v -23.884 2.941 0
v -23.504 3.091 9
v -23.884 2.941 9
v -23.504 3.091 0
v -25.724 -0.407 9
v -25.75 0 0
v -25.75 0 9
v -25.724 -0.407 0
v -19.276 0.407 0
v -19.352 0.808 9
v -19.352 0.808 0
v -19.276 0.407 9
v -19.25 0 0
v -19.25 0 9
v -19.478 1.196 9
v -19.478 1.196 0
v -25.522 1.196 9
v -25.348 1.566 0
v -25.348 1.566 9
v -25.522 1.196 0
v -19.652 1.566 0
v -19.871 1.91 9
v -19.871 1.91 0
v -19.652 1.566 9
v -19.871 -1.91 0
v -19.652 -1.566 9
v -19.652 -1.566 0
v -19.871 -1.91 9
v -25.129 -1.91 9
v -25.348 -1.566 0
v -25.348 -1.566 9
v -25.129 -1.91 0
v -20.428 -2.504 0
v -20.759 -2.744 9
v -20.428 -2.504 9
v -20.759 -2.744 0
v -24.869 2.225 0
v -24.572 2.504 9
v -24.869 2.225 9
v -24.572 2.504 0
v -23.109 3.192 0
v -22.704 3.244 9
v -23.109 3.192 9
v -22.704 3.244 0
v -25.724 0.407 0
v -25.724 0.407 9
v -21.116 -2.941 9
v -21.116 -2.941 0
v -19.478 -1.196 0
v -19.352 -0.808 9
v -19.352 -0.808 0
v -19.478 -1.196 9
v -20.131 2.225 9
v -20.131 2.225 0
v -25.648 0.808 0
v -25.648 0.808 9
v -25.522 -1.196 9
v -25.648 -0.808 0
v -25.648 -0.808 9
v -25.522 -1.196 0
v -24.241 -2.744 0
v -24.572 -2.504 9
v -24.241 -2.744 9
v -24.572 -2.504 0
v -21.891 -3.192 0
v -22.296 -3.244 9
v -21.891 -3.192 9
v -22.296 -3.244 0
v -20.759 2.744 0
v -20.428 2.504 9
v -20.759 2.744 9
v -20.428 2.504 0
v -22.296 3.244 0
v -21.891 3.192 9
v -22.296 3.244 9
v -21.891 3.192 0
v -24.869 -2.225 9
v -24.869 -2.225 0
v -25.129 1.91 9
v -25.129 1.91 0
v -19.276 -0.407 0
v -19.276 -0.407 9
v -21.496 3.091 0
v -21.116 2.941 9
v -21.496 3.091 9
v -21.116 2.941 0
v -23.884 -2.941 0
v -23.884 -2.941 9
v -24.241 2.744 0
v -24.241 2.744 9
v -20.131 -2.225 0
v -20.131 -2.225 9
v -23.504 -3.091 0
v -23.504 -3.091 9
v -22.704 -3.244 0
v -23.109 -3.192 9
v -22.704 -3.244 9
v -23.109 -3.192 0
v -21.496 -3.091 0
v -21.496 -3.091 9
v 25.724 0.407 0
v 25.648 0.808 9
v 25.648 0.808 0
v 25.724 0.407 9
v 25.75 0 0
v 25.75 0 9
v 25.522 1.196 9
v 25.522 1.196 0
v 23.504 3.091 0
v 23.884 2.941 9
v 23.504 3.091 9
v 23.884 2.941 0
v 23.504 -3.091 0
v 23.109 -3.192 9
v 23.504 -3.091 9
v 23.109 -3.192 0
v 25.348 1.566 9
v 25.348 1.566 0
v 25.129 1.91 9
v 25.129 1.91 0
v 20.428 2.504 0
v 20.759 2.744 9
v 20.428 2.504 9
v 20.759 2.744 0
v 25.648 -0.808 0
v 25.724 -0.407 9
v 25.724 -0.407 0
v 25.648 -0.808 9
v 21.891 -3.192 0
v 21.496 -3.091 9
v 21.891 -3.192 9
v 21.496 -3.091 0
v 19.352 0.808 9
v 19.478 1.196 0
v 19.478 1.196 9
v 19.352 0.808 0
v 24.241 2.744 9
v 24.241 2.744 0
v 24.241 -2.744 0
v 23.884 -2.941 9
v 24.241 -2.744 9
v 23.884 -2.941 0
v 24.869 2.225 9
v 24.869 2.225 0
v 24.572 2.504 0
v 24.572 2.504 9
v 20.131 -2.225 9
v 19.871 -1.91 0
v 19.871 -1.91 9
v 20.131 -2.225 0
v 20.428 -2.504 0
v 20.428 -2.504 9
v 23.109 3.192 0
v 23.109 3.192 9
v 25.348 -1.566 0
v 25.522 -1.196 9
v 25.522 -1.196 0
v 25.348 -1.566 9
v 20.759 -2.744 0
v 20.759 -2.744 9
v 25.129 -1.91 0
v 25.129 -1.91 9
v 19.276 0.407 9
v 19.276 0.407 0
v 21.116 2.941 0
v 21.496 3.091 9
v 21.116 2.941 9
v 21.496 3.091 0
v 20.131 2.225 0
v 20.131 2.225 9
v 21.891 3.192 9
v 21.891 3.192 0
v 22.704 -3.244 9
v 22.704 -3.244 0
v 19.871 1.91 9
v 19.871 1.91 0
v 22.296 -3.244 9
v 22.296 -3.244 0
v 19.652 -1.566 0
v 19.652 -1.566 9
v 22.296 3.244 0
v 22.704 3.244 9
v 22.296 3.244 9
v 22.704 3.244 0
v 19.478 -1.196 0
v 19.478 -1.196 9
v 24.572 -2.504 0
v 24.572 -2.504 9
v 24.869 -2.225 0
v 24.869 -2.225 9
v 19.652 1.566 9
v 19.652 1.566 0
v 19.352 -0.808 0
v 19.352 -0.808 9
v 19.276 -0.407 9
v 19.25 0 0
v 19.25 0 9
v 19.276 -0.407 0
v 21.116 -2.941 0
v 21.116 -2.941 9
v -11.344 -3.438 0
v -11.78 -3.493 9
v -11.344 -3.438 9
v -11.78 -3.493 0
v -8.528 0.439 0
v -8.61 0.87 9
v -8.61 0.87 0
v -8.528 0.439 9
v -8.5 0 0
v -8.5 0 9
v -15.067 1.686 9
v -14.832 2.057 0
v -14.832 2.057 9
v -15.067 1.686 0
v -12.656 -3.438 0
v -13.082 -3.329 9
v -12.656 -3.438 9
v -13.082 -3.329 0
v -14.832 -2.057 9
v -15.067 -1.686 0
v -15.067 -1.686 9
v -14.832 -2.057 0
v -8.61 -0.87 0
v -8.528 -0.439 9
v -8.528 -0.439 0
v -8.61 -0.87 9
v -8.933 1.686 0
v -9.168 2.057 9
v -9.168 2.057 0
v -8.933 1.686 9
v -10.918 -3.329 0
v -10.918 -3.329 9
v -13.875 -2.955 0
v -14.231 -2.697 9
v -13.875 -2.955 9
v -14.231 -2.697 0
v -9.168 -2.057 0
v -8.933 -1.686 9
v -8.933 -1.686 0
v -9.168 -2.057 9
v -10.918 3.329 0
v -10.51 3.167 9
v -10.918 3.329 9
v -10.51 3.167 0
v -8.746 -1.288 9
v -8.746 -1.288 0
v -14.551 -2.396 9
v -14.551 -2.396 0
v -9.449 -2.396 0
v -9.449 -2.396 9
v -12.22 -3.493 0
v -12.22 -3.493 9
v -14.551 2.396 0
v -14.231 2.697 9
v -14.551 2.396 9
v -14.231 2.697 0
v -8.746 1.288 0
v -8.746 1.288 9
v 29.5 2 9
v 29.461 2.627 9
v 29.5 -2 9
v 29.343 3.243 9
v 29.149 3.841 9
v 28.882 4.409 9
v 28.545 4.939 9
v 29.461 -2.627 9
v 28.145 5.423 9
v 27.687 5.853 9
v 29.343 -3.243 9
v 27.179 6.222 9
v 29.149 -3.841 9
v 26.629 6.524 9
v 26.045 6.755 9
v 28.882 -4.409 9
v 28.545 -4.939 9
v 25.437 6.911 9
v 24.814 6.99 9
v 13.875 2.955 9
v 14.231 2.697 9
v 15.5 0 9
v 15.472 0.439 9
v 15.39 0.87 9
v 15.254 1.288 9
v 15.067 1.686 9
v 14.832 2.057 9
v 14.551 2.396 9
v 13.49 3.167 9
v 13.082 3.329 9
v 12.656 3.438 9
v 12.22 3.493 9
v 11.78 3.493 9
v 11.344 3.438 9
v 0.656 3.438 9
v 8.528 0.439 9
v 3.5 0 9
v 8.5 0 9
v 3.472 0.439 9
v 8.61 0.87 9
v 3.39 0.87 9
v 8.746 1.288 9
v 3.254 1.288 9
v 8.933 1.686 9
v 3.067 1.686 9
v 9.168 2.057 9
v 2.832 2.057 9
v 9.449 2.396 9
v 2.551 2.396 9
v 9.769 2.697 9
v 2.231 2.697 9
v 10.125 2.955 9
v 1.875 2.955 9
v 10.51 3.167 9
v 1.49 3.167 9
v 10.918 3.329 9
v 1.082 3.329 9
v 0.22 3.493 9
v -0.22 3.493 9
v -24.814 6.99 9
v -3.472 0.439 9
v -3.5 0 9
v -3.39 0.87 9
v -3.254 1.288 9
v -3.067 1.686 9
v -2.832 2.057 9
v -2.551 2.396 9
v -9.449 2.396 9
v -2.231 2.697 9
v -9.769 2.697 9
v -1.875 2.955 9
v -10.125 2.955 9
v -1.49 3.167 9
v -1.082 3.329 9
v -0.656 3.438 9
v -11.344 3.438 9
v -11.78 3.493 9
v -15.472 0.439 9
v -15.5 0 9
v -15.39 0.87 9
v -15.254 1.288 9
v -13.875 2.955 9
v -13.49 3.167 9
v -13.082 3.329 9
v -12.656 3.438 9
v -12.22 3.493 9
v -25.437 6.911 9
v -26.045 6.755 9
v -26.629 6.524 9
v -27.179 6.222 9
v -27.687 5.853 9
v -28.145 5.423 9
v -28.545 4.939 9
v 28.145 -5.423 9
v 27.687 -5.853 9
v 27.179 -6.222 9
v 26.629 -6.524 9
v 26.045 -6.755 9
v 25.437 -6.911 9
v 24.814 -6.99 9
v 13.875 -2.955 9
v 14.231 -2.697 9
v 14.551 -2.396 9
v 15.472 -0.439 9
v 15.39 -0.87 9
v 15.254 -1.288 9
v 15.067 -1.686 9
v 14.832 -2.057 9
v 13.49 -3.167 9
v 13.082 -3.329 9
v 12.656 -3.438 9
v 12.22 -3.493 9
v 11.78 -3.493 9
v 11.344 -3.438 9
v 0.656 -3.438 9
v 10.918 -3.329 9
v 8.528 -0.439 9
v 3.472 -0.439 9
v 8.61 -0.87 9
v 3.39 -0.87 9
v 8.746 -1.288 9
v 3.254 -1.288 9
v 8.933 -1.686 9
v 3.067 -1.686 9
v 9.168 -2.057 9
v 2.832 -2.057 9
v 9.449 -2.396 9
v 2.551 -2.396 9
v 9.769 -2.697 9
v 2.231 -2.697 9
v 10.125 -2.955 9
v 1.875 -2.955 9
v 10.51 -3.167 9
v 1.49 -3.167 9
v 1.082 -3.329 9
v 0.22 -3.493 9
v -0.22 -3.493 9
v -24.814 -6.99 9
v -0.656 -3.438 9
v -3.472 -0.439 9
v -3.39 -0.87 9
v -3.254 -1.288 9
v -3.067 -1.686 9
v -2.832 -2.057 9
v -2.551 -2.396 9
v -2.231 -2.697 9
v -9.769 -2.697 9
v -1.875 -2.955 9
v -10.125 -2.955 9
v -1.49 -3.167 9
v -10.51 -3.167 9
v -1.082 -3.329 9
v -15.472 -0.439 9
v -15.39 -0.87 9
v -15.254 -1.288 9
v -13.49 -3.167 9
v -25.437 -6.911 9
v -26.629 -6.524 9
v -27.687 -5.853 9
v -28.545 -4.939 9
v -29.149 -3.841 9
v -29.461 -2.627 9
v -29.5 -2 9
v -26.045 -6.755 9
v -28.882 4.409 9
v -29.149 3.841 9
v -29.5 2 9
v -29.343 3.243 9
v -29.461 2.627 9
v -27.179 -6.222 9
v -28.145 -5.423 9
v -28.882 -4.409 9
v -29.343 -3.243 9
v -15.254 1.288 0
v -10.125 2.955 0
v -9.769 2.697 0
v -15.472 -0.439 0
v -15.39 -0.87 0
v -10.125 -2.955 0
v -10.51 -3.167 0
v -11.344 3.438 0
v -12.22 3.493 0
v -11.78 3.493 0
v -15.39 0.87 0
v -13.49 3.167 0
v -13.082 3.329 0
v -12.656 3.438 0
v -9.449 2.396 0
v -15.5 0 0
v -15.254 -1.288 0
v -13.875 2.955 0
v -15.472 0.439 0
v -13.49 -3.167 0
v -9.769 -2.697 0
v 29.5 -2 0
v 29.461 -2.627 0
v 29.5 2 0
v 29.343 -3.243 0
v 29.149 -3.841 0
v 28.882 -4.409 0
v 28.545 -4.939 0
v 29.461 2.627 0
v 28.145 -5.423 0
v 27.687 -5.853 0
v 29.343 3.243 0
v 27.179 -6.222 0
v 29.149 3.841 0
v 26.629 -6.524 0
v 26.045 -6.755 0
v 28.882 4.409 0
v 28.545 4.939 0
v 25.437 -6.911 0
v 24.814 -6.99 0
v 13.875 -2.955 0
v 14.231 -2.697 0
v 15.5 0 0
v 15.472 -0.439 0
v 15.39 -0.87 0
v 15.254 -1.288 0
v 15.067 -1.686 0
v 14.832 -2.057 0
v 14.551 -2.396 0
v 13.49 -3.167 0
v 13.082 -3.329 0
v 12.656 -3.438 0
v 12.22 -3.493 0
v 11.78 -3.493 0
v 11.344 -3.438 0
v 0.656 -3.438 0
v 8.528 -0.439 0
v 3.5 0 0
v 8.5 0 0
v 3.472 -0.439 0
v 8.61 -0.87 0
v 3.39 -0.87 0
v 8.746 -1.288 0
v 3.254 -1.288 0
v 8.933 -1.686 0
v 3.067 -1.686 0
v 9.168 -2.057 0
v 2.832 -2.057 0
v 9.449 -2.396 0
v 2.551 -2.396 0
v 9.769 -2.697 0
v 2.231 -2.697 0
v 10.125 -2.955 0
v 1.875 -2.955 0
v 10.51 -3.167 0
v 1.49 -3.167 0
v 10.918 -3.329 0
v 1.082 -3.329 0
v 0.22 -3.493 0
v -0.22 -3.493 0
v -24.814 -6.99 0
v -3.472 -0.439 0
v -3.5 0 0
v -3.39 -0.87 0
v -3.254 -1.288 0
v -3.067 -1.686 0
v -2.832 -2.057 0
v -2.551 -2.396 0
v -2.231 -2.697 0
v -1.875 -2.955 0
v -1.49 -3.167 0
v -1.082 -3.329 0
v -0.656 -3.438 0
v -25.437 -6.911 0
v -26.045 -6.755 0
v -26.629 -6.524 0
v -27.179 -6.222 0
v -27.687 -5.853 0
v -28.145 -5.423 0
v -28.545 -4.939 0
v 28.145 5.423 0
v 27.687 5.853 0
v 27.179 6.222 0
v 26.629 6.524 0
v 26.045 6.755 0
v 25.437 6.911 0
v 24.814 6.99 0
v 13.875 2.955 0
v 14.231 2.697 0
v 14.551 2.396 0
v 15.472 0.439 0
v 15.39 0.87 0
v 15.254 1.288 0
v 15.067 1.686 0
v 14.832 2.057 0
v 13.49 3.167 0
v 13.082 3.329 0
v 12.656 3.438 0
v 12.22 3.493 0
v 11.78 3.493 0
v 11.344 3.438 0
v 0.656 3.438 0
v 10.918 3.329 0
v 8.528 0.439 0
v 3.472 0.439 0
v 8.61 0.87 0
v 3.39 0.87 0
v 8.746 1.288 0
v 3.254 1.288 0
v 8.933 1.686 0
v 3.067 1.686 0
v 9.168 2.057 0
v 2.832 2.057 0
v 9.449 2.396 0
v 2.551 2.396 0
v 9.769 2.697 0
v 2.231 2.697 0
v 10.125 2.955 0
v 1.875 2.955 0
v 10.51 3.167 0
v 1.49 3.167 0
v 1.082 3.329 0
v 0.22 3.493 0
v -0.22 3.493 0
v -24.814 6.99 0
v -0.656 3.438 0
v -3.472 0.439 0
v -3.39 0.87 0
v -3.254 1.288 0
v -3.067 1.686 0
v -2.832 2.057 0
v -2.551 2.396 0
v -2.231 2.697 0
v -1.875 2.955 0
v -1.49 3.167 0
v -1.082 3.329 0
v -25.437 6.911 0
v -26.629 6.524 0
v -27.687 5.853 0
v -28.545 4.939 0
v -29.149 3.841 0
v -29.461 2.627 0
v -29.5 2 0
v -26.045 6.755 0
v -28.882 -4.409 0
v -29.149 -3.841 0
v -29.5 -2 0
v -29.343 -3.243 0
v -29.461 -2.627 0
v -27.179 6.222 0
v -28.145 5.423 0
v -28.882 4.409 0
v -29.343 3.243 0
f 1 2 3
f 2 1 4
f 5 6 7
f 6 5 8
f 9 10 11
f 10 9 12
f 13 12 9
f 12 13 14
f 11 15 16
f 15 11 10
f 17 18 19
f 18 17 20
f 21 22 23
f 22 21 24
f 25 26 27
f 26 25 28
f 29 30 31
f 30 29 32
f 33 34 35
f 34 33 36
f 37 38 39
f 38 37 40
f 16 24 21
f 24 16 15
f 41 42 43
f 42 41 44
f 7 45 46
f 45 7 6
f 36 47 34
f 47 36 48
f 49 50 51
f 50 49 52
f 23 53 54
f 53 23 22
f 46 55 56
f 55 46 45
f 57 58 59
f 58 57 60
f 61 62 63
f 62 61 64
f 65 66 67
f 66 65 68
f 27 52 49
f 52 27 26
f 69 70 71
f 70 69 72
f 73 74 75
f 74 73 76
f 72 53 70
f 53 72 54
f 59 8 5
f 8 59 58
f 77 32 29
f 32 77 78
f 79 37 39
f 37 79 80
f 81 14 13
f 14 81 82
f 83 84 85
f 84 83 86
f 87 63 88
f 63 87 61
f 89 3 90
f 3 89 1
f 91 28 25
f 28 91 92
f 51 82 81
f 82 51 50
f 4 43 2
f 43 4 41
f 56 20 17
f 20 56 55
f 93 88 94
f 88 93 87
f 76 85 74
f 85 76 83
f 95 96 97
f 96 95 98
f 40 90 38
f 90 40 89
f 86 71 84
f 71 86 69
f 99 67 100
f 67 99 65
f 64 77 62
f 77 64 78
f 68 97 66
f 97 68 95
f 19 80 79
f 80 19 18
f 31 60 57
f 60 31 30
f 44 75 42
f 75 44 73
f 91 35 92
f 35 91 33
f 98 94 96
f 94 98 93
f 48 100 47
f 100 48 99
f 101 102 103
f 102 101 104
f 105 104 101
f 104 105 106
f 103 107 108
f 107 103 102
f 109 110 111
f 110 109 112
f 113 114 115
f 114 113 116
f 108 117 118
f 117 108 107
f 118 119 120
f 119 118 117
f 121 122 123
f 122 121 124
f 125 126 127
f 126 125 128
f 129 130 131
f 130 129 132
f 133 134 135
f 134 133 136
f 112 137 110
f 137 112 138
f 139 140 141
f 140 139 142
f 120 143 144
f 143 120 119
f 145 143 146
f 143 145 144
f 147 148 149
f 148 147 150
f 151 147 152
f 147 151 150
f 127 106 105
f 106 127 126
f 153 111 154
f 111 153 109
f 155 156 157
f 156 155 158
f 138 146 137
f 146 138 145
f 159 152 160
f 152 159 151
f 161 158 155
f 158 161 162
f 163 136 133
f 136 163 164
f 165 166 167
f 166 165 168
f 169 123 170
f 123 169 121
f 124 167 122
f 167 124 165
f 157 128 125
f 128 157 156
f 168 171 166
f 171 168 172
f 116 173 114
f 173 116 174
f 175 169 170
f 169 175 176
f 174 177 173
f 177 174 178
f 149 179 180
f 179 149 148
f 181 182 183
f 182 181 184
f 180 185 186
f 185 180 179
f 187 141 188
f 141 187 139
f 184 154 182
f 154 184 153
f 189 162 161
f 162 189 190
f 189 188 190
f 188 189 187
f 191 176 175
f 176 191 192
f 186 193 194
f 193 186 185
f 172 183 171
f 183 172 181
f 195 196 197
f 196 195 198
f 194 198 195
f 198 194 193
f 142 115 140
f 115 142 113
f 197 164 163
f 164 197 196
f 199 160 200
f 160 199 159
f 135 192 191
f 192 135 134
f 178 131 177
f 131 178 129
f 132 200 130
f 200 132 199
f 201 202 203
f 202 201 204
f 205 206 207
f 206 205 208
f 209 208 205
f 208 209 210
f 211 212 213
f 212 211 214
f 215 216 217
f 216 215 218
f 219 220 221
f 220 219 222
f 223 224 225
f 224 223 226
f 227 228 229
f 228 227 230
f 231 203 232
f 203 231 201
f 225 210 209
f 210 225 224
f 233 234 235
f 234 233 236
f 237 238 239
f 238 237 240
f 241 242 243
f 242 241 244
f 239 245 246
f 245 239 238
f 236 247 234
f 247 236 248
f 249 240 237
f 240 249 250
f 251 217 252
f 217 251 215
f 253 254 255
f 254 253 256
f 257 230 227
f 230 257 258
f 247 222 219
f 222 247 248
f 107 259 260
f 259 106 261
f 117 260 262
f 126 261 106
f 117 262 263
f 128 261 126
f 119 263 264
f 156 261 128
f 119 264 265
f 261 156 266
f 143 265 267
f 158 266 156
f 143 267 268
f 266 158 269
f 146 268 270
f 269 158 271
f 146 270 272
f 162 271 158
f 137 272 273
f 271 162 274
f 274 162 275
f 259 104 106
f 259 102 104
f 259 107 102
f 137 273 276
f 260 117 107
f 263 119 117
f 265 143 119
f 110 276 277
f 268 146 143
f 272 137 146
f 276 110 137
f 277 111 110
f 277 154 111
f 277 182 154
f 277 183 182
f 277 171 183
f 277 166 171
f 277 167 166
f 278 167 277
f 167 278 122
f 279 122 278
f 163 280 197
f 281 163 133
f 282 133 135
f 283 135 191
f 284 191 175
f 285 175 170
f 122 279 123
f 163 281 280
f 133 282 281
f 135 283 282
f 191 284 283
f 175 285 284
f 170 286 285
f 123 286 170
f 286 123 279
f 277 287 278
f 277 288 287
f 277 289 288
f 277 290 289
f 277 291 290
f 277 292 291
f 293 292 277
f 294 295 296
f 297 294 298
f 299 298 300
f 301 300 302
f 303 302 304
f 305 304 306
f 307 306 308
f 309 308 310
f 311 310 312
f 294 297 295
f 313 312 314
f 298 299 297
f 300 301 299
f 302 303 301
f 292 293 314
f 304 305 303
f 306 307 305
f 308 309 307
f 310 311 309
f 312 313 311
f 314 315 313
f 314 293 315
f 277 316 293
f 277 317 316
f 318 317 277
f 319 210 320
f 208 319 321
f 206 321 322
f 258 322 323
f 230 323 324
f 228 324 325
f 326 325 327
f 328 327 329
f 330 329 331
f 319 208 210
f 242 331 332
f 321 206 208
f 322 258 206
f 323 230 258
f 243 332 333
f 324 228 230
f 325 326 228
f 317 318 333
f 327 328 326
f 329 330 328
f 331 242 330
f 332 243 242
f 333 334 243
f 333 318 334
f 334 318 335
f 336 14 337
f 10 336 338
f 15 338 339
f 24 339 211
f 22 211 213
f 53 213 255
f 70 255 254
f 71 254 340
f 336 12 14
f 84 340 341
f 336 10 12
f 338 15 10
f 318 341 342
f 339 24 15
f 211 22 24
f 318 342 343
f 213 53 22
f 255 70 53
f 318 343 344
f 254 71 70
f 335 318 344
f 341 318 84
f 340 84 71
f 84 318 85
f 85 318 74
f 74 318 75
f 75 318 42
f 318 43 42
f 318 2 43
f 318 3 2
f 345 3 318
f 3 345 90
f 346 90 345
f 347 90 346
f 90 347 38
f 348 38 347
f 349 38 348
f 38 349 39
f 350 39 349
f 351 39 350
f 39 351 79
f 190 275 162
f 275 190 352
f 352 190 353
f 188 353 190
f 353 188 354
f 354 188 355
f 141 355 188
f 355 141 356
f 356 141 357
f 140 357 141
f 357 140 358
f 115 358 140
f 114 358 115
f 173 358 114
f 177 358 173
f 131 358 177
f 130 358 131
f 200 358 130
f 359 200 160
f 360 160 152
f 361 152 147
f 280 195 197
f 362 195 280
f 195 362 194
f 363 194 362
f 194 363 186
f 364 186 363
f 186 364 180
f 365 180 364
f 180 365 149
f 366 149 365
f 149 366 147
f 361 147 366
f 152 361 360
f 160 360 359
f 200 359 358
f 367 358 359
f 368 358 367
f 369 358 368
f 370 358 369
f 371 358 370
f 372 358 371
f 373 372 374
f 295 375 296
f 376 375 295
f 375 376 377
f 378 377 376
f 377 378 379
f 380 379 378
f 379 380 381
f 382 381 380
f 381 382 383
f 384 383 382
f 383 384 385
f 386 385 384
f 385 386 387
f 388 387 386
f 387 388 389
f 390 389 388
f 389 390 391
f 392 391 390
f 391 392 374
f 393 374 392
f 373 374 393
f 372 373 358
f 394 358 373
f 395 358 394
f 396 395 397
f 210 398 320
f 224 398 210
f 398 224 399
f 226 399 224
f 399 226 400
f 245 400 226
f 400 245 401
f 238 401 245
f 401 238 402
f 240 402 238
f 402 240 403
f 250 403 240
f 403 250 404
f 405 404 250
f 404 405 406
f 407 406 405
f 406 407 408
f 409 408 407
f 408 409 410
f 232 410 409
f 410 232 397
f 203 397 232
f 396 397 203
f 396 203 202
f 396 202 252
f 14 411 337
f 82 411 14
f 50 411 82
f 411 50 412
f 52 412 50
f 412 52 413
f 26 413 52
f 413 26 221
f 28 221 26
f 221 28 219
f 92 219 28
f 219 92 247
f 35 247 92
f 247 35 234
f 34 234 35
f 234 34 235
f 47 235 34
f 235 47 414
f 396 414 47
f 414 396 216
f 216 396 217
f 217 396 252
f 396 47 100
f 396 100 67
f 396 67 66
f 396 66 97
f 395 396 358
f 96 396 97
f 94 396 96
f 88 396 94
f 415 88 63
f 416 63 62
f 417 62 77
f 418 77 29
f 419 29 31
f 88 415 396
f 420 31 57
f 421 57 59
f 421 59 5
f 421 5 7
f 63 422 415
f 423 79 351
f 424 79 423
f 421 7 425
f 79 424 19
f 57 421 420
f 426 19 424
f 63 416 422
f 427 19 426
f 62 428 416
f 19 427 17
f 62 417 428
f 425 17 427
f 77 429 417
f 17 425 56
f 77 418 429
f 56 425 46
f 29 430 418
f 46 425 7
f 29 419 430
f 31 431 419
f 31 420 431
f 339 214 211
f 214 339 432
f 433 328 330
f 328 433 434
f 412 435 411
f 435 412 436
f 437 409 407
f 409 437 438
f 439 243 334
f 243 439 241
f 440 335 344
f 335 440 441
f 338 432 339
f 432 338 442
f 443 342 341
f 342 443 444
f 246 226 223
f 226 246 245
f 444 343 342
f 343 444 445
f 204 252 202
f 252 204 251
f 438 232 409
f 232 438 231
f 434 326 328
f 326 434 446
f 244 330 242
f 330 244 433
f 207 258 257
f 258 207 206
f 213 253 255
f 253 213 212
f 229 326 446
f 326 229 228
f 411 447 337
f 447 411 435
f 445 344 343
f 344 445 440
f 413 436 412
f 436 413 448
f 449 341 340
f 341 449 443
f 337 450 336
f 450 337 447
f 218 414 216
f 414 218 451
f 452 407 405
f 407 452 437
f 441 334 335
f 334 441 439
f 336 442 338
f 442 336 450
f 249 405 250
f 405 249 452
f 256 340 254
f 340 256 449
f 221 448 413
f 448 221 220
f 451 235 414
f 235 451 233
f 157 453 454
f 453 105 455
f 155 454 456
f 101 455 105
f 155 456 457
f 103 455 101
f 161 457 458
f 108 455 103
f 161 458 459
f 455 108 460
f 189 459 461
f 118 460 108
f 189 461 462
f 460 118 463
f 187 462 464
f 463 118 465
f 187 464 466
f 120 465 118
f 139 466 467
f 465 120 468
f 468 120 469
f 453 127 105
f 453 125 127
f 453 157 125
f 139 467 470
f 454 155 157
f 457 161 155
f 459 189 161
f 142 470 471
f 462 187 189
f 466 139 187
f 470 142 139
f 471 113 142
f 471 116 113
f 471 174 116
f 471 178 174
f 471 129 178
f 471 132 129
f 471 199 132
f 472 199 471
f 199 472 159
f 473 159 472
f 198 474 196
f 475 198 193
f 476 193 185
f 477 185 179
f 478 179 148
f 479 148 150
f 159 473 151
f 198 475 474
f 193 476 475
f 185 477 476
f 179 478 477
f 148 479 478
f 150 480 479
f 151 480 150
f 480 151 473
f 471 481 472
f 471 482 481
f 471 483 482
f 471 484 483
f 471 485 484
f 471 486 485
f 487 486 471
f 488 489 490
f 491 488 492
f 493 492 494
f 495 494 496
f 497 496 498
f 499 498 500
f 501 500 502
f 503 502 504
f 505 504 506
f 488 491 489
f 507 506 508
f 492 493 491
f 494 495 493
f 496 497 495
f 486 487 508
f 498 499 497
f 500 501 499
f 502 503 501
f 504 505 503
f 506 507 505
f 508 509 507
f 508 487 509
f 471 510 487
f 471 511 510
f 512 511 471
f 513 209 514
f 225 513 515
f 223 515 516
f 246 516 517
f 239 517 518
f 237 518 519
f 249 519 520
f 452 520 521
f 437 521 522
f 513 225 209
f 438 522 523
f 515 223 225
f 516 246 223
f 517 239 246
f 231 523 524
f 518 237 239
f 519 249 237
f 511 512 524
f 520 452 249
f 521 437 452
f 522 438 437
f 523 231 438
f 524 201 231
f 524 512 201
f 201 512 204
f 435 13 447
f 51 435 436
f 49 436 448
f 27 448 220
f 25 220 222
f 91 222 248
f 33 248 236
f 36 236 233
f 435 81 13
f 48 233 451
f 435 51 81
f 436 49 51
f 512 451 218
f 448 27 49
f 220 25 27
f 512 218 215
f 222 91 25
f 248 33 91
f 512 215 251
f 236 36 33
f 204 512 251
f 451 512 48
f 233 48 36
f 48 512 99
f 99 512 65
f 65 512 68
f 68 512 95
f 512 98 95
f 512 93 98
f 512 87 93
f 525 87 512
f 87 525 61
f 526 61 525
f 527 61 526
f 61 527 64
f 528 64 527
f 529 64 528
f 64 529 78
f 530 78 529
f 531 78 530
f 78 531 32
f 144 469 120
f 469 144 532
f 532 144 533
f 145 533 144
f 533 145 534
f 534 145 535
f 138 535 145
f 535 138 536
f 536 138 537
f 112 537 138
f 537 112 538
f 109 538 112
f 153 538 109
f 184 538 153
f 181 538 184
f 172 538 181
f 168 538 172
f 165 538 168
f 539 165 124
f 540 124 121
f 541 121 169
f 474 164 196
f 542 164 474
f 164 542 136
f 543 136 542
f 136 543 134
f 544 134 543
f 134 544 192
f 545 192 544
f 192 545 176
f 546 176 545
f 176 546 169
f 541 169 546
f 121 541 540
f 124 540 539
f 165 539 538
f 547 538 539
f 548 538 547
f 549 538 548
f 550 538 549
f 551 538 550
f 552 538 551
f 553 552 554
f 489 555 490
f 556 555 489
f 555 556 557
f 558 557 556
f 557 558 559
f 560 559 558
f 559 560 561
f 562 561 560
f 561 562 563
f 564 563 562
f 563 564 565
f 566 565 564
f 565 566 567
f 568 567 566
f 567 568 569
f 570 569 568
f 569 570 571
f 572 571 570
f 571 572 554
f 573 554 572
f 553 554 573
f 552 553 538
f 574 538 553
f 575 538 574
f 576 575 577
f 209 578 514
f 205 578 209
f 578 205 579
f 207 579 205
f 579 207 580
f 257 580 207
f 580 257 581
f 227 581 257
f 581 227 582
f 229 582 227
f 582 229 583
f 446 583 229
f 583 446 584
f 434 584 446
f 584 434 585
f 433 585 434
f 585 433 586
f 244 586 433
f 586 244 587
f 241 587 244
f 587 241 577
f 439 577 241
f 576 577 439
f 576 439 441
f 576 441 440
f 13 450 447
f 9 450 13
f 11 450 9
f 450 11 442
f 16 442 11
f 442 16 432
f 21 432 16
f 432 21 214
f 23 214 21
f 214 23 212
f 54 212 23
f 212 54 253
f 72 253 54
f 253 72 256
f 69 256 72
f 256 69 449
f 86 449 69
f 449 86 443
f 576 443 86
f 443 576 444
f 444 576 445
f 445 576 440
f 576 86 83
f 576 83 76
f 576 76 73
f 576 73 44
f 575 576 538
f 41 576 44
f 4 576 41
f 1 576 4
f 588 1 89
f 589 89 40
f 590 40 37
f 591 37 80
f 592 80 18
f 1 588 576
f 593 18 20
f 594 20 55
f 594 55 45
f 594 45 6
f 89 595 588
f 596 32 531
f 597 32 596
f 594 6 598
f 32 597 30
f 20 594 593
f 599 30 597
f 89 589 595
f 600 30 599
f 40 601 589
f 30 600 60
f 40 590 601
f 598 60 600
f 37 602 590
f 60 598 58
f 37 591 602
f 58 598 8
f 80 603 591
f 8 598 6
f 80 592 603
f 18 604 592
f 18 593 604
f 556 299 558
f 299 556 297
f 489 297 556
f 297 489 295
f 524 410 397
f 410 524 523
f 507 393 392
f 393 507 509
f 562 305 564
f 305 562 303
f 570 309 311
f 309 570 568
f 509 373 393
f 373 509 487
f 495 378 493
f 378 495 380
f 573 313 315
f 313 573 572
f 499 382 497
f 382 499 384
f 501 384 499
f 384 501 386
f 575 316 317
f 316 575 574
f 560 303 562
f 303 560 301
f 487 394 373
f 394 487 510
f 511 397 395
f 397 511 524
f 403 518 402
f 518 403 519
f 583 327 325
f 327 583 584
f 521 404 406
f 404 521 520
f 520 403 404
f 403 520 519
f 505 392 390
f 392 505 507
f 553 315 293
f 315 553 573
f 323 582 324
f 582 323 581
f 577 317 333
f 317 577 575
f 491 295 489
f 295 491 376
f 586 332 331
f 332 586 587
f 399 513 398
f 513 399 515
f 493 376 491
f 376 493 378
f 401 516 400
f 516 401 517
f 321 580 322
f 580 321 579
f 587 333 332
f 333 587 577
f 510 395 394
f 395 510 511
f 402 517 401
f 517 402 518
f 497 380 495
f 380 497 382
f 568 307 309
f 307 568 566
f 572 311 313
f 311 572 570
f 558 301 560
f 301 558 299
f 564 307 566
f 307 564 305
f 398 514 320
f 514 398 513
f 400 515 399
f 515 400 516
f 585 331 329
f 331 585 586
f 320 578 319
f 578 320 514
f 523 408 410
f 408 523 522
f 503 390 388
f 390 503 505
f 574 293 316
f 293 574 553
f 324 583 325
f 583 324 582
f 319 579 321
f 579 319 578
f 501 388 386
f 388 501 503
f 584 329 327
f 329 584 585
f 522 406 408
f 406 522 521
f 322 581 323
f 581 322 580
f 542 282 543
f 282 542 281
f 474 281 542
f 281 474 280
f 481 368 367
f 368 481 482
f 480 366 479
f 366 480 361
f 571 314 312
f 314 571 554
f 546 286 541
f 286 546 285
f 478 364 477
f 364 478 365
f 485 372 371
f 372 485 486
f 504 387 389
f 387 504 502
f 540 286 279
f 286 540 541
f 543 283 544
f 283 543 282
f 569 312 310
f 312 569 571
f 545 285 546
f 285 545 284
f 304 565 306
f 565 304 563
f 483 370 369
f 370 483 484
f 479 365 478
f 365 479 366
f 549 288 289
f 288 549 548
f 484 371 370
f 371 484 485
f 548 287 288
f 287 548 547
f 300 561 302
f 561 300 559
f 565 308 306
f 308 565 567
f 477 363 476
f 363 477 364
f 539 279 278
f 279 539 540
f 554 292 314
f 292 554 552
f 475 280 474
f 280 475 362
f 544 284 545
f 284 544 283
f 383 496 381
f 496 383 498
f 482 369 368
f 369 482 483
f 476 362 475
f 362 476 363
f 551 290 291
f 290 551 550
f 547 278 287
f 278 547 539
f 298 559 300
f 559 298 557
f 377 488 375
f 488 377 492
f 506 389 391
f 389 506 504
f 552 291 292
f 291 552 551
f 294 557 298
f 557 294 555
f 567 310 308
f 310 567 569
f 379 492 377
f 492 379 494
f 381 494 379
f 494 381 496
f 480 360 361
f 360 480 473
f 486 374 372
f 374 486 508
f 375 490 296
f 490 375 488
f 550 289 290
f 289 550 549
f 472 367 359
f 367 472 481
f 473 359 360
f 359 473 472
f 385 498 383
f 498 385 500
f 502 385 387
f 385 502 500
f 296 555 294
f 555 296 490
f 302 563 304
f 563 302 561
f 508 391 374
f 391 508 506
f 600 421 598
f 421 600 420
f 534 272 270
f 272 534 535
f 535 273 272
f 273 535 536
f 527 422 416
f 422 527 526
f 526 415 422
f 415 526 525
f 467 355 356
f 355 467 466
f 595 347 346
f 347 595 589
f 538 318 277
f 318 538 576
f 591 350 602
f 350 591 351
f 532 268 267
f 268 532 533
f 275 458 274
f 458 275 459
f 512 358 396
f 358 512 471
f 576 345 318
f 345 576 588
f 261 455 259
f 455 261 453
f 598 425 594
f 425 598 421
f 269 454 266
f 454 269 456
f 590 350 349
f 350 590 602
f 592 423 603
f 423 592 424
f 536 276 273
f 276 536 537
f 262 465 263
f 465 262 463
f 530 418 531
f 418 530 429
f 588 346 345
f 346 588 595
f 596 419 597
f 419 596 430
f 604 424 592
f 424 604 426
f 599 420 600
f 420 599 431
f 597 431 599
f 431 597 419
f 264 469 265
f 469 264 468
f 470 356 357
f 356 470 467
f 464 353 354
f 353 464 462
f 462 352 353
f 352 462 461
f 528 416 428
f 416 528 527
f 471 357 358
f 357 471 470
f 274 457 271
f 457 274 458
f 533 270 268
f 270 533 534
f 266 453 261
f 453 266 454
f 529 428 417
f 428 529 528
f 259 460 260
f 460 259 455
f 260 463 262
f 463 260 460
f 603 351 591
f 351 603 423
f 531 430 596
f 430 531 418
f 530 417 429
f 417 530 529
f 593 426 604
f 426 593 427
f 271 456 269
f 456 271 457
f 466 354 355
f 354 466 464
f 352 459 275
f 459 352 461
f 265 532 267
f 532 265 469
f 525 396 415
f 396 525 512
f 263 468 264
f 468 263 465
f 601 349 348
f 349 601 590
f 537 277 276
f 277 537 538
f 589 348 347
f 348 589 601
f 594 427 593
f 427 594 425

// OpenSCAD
$fn = 50;


difference() {
	union() {
		hull() {
			translate(v = [-24.5000000000, 2.0000000000, 0]) {
				cylinder(h = 9, r = 5);
			}
			translate(v = [24.5000000000, 2.0000000000, 0]) {
				cylinder(h = 9, r = 5);
			}
			translate(v = [-24.5000000000, -2.0000000000, 0]) {
				cylinder(h = 9, r = 5);
			}
			translate(v = [24.5000000000, -2.0000000000, 0]) {
				cylinder(h = 9, r = 5);
			}
		}
	}
	union() {
		#translate(v = [-22.5000000000, 0.0000000000, 0]) {
			cylinder(h = 9, r = 3.2500000000);
		}
		#translate(v = [22.5000000000, 0.0000000000, 0]) {
			cylinder(h = 9, r = 3.2500000000);
		}
		#translate(v = [-22.5000000000, 0.0000000000, -100.0000000000]) {
			cylinder(h = 200, r = 3.2500000000);
		}
		#translate(v = [-22.5000000000, 0.0000000000, -100.0000000000]) {
			cylinder(h = 200, r = 3.2500000000);
		}
		#translate(v = [22.5000000000, 0.0000000000, -100.0000000000]) {
			cylinder(h = 200, r = 3.2500000000);
		}
		#translate(v = [22.5000000000, 0.0000000000, -100.0000000000]) {
			cylinder(h = 200, r = 3.2500000000);
		}
		#translate(v = [-22.5000000000, 0.0000000000, 0]) {
			cylinder(h = 9, r = 1.8000000000);
		}
		#translate(v = [22.5000000000, 0.0000000000, 0]) {
			cylinder(h = 9, r = 1.8000000000);
		}
		#translate(v = [-22.5000000000, 0.0000000000, 0]) {
			cylinder(h = 9, r = 1.8000000000);
		}
		#translate(v = [22.5000000000, 0.0000000000, 0]) {
			cylinder(h = 9, r = 1.8000000000);
		}
		#translate(v = [-22.5000000000, 0.0000000000, 0]) {
			cylinder(h = 9, r = 1.8000000000);
		}
		#translate(v = [22.5000000000, 0.0000000000, 0]) {
			cylinder(h = 9, r = 1.8000000000);
		}
		#translate(v = [-12.0000000000, 0, 0]) {
			cylinder(h = 9, r = 3.5000000000);
		}
		#cylinder(h = 9, r = 3.5000000000);
		#translate(v = [12.0000000000, 0, 0]) {
			cylinder(h = 9, r = 3.5000000000);
		}
	}
}
